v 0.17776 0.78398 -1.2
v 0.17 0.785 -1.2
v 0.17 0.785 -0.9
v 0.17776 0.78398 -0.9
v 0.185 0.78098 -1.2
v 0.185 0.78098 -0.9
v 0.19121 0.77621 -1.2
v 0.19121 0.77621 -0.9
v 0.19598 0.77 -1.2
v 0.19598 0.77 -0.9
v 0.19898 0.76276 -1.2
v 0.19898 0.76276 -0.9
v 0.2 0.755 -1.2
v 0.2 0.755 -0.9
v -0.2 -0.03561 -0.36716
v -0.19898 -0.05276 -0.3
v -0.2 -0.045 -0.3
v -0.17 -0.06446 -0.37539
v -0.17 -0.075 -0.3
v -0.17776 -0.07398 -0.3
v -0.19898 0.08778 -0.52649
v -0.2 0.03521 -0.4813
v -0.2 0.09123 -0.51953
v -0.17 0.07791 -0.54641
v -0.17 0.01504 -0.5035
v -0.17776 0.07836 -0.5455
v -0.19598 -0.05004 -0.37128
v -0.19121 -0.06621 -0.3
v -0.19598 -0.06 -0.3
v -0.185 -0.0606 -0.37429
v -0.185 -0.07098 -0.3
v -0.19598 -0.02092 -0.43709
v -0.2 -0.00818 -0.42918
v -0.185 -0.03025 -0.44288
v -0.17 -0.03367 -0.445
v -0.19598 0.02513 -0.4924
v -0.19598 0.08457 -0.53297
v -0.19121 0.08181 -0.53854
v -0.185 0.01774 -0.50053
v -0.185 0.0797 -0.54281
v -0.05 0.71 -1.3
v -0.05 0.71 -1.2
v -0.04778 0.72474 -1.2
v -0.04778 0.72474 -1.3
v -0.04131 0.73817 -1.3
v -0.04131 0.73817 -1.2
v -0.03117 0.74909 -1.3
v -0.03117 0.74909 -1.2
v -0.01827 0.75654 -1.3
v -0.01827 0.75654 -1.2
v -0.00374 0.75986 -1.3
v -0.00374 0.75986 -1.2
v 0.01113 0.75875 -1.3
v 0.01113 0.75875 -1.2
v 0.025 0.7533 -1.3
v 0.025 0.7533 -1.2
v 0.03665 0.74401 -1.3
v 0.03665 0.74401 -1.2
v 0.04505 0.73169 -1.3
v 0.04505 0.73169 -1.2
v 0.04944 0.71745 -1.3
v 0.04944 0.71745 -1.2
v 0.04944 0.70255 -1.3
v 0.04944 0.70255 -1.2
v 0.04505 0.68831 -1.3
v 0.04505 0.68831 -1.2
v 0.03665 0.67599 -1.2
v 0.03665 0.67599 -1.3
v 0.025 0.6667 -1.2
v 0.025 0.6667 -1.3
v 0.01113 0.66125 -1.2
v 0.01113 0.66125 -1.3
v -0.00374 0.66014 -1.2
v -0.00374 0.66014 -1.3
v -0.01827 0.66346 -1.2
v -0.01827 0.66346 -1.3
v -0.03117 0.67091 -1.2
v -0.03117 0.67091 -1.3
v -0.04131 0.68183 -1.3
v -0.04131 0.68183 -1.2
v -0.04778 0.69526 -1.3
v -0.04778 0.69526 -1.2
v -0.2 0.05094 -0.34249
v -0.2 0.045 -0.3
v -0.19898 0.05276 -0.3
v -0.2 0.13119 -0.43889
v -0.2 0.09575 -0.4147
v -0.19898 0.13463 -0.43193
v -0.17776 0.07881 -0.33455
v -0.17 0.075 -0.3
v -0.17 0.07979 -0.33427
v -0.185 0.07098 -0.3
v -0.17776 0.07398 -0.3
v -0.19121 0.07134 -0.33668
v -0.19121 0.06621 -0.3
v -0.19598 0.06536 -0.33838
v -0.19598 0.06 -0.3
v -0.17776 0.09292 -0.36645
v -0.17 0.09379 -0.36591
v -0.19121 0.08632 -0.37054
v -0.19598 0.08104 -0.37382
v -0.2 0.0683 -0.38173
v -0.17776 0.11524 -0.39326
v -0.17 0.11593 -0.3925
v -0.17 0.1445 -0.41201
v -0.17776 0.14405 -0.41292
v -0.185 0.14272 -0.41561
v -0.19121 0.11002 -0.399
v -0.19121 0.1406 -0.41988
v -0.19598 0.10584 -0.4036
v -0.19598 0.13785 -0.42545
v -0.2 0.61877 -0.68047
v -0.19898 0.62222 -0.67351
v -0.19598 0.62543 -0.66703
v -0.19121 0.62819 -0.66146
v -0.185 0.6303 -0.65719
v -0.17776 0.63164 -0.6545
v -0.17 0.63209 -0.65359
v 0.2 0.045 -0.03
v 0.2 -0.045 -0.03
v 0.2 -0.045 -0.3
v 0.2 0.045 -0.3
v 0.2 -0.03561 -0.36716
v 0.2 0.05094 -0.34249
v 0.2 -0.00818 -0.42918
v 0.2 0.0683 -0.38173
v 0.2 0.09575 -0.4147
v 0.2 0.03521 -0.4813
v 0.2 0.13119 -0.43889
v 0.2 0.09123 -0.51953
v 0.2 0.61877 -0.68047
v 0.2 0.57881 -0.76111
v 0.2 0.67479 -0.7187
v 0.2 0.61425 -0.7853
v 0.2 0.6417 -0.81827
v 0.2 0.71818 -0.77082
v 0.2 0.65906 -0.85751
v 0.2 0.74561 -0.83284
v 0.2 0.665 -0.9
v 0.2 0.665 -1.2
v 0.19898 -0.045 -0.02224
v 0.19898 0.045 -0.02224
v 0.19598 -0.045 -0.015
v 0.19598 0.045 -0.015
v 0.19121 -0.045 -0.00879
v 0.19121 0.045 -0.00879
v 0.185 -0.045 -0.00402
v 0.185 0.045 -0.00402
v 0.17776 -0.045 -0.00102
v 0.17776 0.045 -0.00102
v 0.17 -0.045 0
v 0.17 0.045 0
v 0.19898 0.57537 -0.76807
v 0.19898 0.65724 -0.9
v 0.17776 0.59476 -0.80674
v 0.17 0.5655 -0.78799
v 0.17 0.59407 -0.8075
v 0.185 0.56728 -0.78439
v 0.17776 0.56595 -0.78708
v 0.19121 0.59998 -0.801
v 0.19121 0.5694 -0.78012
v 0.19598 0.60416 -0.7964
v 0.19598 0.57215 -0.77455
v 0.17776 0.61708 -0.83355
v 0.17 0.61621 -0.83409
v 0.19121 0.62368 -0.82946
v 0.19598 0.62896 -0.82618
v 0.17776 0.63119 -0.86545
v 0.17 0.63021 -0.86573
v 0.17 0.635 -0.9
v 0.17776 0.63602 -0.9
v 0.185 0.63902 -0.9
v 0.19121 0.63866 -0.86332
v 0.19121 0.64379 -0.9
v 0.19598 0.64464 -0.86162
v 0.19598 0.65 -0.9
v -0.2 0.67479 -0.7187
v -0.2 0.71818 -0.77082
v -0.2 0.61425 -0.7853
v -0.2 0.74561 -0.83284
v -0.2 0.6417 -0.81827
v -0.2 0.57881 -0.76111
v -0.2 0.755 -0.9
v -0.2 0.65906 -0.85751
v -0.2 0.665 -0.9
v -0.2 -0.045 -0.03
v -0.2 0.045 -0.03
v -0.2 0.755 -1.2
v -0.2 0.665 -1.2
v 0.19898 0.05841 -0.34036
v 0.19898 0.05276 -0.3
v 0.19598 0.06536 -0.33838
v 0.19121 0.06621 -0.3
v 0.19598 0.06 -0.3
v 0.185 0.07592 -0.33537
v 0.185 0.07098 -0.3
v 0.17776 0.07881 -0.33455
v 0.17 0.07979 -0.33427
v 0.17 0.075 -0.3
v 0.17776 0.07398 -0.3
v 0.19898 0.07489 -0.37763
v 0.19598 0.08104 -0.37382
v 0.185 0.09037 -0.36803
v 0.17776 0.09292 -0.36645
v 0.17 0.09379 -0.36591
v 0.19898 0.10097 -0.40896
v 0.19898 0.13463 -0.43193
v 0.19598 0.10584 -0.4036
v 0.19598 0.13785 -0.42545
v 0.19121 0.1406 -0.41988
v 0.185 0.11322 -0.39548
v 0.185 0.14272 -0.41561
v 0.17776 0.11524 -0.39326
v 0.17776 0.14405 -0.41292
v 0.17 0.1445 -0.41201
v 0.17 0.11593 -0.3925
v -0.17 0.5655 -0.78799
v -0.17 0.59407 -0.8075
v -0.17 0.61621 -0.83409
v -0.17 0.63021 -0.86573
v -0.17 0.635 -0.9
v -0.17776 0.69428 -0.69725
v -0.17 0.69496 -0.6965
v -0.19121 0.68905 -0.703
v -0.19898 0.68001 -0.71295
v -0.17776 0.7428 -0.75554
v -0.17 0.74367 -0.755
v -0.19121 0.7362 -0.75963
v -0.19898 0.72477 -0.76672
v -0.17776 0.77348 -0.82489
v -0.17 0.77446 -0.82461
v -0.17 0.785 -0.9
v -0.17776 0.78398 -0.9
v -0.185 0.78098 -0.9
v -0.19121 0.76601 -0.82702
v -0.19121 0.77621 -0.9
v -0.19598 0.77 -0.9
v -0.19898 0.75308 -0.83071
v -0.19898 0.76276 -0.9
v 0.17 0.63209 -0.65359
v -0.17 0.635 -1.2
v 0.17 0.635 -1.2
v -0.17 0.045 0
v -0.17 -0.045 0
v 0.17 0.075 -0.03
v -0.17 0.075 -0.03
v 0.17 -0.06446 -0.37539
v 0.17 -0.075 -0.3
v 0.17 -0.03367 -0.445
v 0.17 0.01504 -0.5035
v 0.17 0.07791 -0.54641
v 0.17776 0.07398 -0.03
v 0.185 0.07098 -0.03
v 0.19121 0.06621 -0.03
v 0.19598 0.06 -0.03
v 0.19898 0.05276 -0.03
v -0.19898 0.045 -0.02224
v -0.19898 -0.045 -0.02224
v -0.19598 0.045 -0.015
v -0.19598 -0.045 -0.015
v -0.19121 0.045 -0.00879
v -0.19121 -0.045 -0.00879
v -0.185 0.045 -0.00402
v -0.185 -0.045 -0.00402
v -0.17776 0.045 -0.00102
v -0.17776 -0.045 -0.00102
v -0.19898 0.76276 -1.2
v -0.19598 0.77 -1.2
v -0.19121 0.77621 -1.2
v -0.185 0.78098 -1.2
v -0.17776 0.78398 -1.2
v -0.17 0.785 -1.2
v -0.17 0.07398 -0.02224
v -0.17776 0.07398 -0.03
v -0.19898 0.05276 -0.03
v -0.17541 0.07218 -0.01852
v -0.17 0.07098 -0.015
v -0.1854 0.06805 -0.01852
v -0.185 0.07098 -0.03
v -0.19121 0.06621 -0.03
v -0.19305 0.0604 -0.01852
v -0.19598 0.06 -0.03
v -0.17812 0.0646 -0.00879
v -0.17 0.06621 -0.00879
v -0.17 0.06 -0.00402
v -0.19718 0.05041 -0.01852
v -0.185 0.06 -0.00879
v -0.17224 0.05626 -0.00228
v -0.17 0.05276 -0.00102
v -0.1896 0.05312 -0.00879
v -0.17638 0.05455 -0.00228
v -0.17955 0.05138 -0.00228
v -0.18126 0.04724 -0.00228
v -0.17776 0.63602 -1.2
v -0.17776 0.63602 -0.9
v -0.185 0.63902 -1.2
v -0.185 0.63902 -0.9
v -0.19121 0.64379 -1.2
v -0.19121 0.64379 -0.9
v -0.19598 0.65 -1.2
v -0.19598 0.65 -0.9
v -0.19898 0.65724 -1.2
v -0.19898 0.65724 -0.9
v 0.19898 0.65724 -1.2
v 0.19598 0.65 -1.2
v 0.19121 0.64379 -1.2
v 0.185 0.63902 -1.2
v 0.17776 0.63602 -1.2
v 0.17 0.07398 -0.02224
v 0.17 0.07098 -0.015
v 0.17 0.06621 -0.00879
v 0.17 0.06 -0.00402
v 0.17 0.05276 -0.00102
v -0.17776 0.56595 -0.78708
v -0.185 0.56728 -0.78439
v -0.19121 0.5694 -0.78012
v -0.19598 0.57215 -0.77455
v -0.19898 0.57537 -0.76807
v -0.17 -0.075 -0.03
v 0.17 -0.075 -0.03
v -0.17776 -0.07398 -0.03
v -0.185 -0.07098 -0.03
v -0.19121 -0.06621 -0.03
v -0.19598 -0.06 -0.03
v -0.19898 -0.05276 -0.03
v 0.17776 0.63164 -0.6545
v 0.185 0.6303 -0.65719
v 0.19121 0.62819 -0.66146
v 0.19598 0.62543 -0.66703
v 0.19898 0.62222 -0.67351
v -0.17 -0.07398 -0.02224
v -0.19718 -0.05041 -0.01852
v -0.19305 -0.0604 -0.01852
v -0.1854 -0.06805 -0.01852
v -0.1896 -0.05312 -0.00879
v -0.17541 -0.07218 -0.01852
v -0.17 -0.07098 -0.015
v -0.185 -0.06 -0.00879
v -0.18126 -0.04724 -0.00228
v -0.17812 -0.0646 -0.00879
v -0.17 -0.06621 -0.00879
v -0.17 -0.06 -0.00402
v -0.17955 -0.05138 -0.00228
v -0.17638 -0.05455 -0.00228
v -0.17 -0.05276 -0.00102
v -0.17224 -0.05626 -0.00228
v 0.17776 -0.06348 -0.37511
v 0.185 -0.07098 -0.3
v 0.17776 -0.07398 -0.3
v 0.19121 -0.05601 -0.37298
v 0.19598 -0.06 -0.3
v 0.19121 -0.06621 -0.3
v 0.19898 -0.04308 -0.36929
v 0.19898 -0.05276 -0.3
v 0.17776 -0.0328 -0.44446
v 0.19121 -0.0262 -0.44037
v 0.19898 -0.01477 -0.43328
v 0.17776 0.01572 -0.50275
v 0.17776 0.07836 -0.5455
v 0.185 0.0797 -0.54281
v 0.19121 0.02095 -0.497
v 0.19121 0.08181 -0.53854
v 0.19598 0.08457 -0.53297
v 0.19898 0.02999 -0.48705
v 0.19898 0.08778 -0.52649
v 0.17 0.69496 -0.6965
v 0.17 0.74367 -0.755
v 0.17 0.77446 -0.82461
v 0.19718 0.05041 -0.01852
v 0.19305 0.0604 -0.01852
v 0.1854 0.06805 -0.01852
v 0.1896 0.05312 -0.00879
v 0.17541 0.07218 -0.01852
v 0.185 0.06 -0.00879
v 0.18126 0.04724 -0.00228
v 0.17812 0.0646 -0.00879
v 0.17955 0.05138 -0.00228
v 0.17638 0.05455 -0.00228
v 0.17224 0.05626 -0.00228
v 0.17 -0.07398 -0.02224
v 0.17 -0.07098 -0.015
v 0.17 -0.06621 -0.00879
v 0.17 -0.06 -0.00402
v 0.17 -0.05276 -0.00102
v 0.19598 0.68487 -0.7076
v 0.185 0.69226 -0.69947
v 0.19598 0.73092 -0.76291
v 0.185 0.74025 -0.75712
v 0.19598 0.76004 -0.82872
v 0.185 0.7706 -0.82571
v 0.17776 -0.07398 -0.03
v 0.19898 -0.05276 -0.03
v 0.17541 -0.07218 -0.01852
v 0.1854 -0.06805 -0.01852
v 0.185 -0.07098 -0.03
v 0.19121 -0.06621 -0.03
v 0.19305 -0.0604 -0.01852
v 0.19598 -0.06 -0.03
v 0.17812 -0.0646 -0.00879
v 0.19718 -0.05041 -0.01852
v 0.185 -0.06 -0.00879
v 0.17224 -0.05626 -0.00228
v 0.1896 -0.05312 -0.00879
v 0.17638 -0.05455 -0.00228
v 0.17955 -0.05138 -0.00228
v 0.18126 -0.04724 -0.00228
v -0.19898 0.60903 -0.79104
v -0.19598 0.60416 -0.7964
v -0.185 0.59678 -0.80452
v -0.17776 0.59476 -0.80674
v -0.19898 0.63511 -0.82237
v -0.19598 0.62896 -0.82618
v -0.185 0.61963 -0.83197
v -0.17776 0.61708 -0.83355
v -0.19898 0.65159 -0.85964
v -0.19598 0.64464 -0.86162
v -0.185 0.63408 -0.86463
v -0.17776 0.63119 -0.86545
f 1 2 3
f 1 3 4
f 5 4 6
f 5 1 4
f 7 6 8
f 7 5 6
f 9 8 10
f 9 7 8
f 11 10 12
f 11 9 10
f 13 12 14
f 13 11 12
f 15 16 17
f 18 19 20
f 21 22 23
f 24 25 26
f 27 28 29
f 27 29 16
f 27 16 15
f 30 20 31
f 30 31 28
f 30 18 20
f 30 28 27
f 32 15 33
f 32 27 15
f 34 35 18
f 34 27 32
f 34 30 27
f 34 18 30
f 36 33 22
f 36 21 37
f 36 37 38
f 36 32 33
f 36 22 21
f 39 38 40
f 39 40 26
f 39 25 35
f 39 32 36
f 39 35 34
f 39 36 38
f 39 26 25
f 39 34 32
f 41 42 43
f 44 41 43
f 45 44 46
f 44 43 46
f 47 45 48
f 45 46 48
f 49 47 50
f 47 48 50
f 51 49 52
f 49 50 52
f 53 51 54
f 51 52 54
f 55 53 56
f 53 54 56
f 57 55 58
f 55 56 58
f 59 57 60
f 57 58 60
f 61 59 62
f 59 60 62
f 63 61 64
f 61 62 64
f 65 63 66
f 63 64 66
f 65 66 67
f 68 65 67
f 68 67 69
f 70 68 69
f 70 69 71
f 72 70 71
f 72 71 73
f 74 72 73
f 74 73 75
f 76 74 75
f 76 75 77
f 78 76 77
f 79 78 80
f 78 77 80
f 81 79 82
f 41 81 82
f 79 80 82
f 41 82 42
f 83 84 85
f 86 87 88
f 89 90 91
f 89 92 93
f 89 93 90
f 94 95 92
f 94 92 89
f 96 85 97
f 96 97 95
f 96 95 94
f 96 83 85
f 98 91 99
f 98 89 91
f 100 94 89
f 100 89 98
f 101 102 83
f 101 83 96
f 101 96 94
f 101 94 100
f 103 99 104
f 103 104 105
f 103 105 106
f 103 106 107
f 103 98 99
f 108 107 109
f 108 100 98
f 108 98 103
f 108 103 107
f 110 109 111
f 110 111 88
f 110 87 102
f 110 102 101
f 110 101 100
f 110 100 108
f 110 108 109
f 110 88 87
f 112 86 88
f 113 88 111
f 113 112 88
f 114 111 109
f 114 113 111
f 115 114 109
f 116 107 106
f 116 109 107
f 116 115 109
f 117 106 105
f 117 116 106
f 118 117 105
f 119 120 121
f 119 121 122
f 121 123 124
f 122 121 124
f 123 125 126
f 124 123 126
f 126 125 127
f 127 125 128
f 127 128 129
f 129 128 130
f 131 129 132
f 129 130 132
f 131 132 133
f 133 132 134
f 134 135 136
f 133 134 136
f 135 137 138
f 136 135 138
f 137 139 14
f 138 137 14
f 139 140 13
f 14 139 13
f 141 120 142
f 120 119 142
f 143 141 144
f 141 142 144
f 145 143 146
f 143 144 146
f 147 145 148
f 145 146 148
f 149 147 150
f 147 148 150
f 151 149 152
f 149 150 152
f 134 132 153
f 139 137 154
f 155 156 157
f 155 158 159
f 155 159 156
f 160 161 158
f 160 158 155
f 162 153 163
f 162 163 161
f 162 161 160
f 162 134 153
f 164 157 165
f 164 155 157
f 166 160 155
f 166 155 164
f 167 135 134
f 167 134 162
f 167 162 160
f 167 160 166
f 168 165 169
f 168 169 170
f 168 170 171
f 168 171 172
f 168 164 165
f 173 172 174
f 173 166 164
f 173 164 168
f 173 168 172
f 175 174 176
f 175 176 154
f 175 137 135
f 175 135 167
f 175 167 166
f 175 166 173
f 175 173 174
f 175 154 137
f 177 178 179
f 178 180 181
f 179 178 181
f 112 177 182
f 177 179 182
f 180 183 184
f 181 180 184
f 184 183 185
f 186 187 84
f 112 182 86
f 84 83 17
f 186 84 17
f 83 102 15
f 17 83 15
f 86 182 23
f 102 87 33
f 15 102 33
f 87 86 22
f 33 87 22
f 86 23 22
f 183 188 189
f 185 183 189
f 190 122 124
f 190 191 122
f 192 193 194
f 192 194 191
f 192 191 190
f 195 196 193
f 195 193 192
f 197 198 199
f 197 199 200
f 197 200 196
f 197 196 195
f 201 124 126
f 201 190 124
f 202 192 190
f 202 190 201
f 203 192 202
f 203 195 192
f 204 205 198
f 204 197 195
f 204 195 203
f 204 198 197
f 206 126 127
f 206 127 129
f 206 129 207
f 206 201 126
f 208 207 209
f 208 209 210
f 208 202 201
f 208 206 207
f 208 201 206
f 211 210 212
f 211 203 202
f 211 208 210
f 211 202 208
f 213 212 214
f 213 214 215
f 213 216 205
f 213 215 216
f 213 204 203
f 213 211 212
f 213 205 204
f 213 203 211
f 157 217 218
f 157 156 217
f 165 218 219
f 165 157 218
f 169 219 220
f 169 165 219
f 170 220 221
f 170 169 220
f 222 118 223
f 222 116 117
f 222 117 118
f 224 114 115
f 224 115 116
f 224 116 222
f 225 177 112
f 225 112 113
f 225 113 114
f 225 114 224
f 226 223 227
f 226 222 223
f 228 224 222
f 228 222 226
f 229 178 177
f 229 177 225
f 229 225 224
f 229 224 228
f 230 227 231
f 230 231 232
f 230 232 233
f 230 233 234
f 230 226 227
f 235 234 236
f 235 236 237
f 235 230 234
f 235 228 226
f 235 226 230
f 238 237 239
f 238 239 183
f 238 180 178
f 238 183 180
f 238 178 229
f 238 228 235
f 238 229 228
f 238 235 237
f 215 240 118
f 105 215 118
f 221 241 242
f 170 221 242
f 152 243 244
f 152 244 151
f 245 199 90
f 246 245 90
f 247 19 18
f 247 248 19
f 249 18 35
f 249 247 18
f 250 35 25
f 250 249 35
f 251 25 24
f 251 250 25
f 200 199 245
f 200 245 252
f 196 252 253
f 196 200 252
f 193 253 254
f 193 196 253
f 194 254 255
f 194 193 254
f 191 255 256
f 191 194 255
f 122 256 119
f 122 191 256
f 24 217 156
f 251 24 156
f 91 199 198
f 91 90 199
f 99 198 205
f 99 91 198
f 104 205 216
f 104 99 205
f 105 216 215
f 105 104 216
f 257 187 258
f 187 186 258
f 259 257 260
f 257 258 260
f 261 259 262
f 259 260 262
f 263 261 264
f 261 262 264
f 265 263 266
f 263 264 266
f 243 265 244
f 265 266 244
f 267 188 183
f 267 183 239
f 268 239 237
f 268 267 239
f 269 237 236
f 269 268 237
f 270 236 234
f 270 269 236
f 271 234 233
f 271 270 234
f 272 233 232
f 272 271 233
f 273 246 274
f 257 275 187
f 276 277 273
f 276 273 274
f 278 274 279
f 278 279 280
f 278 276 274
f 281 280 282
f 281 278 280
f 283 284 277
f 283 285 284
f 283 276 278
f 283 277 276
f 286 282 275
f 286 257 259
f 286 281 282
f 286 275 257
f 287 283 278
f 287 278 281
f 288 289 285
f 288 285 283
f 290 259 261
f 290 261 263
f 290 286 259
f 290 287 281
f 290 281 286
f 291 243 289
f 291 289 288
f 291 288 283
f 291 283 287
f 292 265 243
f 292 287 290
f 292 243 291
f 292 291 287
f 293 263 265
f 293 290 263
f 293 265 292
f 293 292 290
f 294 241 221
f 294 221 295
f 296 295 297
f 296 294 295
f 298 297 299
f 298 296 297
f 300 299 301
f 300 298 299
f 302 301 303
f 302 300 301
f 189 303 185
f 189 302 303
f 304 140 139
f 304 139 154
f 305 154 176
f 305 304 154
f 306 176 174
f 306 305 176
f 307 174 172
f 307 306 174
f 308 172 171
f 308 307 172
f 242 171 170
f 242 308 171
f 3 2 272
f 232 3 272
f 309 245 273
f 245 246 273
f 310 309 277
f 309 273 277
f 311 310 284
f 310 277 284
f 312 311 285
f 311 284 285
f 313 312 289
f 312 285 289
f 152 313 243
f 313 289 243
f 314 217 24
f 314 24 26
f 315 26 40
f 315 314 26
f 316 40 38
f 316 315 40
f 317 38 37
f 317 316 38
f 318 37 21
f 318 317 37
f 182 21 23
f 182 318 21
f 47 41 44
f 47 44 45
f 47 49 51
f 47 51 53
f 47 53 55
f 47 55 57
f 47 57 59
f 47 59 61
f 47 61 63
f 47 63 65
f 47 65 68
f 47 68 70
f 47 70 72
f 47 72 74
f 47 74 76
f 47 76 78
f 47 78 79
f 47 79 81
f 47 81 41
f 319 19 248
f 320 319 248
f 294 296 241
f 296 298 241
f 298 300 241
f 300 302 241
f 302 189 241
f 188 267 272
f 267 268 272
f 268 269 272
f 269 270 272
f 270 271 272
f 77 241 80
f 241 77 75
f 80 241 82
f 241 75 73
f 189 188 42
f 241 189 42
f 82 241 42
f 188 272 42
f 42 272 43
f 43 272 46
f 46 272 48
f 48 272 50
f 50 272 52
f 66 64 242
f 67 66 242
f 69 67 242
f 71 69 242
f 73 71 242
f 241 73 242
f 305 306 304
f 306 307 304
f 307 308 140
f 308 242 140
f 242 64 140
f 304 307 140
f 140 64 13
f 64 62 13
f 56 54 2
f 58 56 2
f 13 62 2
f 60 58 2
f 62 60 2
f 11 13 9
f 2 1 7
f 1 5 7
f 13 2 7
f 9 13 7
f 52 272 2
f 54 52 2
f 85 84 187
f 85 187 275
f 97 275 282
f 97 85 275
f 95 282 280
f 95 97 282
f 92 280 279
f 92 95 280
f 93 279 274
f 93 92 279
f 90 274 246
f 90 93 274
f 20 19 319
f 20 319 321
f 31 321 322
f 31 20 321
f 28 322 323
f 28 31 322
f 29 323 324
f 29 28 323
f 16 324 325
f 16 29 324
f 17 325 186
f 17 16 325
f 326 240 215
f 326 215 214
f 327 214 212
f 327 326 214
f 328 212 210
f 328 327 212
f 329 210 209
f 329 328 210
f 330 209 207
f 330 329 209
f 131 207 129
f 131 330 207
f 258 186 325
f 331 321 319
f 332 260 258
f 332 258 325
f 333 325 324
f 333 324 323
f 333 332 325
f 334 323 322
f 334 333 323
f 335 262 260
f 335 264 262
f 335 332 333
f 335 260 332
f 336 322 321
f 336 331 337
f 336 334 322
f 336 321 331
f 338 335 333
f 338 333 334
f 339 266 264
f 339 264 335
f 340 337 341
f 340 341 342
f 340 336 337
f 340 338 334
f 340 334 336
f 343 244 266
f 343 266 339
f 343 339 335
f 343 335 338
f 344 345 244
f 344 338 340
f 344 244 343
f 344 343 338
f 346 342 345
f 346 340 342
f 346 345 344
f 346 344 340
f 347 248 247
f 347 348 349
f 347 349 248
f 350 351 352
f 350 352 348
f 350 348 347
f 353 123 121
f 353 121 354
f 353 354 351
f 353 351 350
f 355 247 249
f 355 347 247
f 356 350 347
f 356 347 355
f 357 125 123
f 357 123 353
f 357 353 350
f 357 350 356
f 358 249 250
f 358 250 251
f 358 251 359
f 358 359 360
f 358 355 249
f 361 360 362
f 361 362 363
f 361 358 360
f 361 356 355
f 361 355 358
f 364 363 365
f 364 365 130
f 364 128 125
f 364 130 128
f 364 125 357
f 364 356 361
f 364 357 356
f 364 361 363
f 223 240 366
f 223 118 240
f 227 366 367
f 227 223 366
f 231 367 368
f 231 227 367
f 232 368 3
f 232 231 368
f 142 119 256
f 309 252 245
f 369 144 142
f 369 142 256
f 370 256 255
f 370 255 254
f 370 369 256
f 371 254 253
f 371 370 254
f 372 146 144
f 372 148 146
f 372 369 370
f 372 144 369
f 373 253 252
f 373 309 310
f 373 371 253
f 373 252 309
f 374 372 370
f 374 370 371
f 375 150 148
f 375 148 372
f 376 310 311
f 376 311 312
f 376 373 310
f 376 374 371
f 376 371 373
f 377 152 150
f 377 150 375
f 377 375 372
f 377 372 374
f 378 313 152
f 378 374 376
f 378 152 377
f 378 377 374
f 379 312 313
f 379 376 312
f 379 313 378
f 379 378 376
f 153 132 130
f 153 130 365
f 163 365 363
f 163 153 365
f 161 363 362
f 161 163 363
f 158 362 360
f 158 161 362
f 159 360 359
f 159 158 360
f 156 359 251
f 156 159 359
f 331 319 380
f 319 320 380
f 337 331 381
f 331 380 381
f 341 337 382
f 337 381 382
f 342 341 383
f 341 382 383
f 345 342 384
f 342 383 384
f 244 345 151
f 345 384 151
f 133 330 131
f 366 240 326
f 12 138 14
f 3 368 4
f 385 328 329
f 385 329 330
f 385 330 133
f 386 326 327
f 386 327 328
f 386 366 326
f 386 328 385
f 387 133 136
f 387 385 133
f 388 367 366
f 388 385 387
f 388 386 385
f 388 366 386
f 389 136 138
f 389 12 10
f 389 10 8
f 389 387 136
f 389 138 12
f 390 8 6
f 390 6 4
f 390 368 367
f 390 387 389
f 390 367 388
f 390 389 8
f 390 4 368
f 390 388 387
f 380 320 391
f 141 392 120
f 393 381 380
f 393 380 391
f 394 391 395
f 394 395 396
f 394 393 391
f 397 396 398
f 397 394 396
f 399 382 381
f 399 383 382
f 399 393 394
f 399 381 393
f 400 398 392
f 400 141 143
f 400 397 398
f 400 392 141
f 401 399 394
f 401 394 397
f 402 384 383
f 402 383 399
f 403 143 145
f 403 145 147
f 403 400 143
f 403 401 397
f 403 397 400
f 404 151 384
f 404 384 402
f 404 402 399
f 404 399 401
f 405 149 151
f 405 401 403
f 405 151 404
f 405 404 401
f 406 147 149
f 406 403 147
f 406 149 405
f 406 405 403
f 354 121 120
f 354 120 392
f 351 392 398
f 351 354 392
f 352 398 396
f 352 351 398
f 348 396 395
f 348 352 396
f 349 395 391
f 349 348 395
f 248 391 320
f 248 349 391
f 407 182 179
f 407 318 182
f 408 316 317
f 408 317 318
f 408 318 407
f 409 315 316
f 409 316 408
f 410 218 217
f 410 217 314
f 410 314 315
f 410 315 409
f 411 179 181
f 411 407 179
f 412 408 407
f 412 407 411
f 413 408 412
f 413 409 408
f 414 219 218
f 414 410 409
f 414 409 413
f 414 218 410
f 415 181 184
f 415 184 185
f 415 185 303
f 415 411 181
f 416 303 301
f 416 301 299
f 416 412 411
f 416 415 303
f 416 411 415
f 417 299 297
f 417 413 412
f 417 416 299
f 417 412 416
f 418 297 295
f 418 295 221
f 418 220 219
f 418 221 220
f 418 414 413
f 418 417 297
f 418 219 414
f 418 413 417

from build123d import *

# Parameters (mm, degrees)
FILETE2_R                = 0.03
ESBO_O3_R                = 0.05
RESSALTO_EXTRUS_O1_DEPTH = 0.1


with BuildPart() as part:
    # Varredura1: sweep along a path in Esboço2
    with BuildLine(Plane(origin=(0, 0, 0), x_dir=(0, 0, -1), z_dir=(1, 0, 0))) as varredura1_path:
        Line((0, 0), (0.3, 0))
        ThreePointArc((0.3, 0), (0.405455147, 0.030061152), (0.479209262, 0.11120788))
        Line((0.479209262, 0.11120788), (0.720790738, 0.59879212))
        ThreePointArc((0.720790738, 0.59879212), (0.794544853, 0.679938848), (0.9, 0.71))
        Line((0.9, 0.71), (1.2, 0.71))
    # Esboço1 → Varredura1 (sweep)
    with BuildSketch(Plane.XY):
        with BuildLine():
            Line((-0.17, -0.075), (0.17, -0.075))
            ThreePointArc((0.17, -0.075), (0.191213203, -0.066213203), (0.2, -0.045))
            Line((0.2, -0.045), (0.2, 0.045))
            ThreePointArc((0.2, 0.045), (0.191213203, 0.066213203), (0.17, 0.075))
            Line((0.17, 0.075), (-0.17, 0.075))
            ThreePointArc((-0.17, 0.075), (-0.191213203, 0.066213203), (-0.2, 0.045))
            Line((-0.2, 0.045), (-0.2, -0.045))
            ThreePointArc((-0.2, -0.045), (-0.191213203, -0.066213203), (-0.17, -0.075))
        make_face()
    sweep(path=varredura1_path.line)

    # Filete2
    filete2_edges = [part.edges().sort_by_distance(p)[0] for p in [
        (-0.2, 0, 0),
        (-0.191213203, 0.066213203, 0),
        (0, 0.075, 0),
        (0.191213203, 0.066213203, 0),
        (0.2, 0, 0),
        (0.191213203, -0.066213203, 0),
        (0, -0.075, 0),
        (-0.191213203, -0.066213203, 0),
    ]]
    fillet(filete2_edges, radius=FILETE2_R)

    # Esboço3 → Ressalto-extrusão1 (add)
    with BuildSketch(Plane(origin=(0, 0, -1.2), x_dir=(-1, 0, 0), z_dir=(0, 0, -1))):
        with Locations((0, 0.71)):
            Circle(ESBO_O3_R)
    extrude(amount=RESSALTO_EXTRUS_O1_DEPTH)


solid = part.part
